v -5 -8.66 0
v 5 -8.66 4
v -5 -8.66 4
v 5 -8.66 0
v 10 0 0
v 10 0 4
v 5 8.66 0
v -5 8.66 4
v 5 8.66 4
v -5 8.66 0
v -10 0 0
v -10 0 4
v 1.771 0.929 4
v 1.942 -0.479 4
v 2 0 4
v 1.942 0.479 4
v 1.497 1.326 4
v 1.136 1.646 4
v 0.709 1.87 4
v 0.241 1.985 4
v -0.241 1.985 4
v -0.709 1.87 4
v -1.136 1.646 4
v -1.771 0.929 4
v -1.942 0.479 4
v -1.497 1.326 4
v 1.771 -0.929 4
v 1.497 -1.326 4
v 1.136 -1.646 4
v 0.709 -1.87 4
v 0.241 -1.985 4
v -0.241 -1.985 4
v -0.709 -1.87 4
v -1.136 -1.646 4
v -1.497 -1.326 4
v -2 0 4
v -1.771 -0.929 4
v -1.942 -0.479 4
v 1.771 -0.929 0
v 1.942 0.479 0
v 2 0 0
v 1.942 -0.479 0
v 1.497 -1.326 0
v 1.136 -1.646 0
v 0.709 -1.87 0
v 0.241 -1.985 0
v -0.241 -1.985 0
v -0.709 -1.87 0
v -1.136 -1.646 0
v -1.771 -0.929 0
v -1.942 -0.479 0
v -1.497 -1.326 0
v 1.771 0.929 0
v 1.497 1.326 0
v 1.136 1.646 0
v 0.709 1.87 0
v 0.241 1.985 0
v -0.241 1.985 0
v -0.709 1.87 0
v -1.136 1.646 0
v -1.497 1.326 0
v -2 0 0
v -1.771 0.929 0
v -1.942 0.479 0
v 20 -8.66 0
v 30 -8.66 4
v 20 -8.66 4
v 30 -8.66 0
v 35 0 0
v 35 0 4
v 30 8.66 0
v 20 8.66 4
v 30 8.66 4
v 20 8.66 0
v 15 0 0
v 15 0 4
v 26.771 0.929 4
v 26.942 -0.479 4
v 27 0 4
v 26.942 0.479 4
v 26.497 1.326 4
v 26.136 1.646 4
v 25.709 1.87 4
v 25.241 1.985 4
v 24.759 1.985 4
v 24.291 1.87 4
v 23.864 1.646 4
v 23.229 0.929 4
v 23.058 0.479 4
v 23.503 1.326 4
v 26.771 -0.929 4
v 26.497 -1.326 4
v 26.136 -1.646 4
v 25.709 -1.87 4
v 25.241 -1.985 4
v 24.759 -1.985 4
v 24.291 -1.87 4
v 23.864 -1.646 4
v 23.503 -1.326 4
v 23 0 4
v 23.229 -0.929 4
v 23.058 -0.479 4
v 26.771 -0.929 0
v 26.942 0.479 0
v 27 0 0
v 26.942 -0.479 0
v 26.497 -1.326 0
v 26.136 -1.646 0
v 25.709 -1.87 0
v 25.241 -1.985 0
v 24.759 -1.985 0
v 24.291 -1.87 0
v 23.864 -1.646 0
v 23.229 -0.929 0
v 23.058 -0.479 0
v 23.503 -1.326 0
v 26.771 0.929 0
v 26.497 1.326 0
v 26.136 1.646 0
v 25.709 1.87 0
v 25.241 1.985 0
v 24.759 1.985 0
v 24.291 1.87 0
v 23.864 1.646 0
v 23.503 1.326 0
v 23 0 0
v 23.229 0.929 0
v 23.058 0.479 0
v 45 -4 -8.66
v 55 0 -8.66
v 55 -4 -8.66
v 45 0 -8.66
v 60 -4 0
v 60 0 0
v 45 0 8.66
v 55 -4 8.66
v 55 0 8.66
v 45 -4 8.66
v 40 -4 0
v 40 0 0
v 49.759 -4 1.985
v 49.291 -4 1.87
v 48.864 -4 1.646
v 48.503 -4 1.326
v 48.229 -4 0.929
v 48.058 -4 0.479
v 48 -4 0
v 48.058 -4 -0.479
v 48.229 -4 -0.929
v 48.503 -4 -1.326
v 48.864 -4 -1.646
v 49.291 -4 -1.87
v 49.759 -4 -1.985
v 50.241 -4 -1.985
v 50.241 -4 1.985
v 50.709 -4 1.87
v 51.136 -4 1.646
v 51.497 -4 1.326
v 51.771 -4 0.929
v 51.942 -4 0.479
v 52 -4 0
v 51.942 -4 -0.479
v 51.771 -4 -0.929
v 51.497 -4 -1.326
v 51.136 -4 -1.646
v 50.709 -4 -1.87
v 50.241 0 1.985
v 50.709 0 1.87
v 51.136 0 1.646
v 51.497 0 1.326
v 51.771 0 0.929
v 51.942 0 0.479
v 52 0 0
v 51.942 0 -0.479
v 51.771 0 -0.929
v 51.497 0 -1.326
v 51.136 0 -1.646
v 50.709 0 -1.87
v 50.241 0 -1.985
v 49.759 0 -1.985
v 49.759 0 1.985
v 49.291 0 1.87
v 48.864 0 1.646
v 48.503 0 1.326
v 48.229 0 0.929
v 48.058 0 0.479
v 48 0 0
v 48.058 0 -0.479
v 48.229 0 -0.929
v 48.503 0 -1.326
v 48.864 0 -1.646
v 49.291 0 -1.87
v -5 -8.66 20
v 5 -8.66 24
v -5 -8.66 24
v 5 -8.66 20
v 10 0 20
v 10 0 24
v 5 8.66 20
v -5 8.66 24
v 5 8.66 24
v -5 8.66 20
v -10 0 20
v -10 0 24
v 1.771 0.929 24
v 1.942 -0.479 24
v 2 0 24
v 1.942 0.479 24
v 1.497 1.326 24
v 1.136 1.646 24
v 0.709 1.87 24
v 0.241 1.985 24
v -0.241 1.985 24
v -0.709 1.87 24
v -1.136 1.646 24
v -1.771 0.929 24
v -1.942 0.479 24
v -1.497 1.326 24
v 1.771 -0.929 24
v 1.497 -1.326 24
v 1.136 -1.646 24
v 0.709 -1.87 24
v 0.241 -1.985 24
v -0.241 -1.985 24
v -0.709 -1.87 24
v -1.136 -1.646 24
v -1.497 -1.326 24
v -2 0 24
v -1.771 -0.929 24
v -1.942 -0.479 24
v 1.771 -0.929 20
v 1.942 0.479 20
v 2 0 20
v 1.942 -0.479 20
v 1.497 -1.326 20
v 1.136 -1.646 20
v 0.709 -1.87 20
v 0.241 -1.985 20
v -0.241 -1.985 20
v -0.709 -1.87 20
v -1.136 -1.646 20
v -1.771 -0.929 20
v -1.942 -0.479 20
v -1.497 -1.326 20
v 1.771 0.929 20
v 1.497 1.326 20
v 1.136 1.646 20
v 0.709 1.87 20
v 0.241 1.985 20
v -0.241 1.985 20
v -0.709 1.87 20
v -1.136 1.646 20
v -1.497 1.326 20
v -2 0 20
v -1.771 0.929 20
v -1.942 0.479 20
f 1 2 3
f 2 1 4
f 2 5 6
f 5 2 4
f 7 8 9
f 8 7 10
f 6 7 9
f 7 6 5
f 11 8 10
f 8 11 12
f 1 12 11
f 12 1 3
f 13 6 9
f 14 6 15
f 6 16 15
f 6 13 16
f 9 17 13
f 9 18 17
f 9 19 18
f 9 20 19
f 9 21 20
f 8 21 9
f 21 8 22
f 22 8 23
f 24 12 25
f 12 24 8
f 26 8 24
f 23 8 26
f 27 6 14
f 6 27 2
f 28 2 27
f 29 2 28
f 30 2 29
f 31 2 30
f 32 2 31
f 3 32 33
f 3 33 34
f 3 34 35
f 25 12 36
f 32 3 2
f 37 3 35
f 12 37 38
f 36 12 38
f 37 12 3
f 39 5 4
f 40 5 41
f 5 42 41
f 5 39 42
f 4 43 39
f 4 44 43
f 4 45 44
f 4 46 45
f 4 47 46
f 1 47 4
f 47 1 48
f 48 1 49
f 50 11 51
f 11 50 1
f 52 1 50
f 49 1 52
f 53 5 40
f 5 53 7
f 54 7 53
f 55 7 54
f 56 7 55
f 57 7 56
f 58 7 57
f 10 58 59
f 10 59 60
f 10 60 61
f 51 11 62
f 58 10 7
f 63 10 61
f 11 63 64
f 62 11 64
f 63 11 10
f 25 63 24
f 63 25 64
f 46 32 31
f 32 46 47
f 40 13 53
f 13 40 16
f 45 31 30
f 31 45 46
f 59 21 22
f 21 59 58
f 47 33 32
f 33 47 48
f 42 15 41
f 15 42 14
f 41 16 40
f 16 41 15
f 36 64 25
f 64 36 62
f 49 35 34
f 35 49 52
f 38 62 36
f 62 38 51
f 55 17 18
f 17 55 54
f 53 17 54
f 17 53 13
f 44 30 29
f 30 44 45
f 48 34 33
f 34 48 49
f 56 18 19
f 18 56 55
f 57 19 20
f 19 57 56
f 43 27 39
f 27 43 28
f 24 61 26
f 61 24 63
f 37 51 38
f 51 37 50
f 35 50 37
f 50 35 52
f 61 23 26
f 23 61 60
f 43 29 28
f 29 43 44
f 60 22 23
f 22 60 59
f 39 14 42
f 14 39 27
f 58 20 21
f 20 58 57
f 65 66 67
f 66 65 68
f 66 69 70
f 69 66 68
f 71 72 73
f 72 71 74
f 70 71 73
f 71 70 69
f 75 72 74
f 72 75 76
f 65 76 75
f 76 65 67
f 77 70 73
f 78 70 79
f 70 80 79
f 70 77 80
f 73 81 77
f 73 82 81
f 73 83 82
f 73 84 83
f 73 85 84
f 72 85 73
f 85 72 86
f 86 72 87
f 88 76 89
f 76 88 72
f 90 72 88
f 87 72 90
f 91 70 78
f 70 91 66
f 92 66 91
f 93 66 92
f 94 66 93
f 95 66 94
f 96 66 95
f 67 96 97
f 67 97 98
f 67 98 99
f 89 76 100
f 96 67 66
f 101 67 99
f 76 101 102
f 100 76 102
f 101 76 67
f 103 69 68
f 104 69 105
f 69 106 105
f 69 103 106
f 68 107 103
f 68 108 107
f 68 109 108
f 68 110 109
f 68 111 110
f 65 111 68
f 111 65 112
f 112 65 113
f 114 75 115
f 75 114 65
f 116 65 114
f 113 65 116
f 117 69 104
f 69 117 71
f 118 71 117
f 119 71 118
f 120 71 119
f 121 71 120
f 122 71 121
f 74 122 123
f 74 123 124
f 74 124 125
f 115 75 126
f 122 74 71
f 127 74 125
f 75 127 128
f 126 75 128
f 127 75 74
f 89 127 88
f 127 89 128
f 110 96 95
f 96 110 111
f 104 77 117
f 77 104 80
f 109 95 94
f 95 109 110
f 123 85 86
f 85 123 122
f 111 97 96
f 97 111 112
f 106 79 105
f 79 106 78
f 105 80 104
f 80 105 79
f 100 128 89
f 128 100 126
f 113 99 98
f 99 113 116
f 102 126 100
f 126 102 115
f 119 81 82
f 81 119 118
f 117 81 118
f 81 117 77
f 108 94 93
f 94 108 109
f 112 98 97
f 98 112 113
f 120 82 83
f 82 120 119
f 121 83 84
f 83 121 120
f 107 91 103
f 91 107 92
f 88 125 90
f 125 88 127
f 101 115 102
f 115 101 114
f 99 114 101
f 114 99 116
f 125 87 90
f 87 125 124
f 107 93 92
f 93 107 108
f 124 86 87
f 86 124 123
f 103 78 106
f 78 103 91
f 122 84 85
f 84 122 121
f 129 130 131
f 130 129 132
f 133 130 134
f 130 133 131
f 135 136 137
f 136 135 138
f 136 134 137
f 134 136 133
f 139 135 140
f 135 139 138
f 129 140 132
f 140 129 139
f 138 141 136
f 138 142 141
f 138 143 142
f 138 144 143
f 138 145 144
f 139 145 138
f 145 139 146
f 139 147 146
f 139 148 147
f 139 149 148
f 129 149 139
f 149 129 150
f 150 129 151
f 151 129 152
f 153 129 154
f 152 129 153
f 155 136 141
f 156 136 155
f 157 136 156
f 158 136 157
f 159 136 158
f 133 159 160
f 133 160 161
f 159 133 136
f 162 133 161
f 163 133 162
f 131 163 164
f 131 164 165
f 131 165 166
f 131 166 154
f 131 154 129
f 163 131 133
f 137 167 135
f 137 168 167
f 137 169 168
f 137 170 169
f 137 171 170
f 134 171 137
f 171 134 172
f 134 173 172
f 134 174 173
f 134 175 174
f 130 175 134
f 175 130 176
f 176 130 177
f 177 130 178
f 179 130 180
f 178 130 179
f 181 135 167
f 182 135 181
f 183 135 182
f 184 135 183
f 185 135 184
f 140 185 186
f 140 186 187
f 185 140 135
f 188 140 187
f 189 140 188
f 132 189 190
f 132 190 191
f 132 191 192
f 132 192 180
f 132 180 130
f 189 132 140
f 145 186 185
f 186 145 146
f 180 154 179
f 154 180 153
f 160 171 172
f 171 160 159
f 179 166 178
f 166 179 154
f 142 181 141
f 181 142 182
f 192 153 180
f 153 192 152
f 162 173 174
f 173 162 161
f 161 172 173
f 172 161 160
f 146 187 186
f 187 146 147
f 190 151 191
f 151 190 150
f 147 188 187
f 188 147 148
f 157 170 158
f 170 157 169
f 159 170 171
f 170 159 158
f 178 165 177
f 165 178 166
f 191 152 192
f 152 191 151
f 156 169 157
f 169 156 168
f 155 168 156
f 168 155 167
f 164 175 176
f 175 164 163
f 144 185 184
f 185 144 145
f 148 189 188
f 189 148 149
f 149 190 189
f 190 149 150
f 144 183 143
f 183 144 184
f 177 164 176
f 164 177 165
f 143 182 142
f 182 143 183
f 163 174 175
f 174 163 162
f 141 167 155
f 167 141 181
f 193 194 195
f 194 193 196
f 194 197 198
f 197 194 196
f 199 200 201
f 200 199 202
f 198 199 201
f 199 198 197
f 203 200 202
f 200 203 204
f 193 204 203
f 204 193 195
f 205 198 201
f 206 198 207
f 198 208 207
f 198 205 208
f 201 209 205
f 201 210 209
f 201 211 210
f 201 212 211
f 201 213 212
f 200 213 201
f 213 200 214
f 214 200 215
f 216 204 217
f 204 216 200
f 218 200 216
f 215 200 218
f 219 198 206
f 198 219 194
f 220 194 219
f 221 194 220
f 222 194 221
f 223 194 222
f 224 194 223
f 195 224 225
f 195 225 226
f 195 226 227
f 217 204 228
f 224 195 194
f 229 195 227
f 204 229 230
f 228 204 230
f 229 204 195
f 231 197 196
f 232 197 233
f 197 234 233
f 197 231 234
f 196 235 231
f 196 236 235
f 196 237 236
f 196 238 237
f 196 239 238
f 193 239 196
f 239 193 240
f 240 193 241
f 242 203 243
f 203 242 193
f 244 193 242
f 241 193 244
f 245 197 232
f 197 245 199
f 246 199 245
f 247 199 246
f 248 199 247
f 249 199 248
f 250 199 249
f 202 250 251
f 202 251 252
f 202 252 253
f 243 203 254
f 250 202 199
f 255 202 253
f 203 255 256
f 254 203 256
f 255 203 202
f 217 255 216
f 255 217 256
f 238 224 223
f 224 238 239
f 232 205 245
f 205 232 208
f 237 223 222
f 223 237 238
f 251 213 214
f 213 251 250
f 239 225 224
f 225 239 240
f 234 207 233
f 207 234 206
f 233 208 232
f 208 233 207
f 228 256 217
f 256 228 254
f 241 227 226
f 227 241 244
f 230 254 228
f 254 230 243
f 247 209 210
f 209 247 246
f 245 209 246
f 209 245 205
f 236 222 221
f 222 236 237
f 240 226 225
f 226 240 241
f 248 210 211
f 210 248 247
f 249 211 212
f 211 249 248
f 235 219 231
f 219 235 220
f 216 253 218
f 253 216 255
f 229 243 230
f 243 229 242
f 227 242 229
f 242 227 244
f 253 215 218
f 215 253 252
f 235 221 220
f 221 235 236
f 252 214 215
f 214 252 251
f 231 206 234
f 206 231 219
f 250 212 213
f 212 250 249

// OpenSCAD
module piulita()
{
    difference(){
        cylinder(h = 4, r = 10, $fn = 6);
    
        translate ([0, 0, -1]) cylinder(h = 6, r = 2, $fn = 26);
    }
}
//........
module piulita_M4()
 {
    piulita(3.5,2,4);
    }
//......
color ("red") piulita();
color ("yellow") translate ([25, 0, 0]) piulita();

color("blue") translate ([50, 0, 0]) rotate([90, 0, 0]) piulita();
translate ([0,0,20])piulita_M4();
